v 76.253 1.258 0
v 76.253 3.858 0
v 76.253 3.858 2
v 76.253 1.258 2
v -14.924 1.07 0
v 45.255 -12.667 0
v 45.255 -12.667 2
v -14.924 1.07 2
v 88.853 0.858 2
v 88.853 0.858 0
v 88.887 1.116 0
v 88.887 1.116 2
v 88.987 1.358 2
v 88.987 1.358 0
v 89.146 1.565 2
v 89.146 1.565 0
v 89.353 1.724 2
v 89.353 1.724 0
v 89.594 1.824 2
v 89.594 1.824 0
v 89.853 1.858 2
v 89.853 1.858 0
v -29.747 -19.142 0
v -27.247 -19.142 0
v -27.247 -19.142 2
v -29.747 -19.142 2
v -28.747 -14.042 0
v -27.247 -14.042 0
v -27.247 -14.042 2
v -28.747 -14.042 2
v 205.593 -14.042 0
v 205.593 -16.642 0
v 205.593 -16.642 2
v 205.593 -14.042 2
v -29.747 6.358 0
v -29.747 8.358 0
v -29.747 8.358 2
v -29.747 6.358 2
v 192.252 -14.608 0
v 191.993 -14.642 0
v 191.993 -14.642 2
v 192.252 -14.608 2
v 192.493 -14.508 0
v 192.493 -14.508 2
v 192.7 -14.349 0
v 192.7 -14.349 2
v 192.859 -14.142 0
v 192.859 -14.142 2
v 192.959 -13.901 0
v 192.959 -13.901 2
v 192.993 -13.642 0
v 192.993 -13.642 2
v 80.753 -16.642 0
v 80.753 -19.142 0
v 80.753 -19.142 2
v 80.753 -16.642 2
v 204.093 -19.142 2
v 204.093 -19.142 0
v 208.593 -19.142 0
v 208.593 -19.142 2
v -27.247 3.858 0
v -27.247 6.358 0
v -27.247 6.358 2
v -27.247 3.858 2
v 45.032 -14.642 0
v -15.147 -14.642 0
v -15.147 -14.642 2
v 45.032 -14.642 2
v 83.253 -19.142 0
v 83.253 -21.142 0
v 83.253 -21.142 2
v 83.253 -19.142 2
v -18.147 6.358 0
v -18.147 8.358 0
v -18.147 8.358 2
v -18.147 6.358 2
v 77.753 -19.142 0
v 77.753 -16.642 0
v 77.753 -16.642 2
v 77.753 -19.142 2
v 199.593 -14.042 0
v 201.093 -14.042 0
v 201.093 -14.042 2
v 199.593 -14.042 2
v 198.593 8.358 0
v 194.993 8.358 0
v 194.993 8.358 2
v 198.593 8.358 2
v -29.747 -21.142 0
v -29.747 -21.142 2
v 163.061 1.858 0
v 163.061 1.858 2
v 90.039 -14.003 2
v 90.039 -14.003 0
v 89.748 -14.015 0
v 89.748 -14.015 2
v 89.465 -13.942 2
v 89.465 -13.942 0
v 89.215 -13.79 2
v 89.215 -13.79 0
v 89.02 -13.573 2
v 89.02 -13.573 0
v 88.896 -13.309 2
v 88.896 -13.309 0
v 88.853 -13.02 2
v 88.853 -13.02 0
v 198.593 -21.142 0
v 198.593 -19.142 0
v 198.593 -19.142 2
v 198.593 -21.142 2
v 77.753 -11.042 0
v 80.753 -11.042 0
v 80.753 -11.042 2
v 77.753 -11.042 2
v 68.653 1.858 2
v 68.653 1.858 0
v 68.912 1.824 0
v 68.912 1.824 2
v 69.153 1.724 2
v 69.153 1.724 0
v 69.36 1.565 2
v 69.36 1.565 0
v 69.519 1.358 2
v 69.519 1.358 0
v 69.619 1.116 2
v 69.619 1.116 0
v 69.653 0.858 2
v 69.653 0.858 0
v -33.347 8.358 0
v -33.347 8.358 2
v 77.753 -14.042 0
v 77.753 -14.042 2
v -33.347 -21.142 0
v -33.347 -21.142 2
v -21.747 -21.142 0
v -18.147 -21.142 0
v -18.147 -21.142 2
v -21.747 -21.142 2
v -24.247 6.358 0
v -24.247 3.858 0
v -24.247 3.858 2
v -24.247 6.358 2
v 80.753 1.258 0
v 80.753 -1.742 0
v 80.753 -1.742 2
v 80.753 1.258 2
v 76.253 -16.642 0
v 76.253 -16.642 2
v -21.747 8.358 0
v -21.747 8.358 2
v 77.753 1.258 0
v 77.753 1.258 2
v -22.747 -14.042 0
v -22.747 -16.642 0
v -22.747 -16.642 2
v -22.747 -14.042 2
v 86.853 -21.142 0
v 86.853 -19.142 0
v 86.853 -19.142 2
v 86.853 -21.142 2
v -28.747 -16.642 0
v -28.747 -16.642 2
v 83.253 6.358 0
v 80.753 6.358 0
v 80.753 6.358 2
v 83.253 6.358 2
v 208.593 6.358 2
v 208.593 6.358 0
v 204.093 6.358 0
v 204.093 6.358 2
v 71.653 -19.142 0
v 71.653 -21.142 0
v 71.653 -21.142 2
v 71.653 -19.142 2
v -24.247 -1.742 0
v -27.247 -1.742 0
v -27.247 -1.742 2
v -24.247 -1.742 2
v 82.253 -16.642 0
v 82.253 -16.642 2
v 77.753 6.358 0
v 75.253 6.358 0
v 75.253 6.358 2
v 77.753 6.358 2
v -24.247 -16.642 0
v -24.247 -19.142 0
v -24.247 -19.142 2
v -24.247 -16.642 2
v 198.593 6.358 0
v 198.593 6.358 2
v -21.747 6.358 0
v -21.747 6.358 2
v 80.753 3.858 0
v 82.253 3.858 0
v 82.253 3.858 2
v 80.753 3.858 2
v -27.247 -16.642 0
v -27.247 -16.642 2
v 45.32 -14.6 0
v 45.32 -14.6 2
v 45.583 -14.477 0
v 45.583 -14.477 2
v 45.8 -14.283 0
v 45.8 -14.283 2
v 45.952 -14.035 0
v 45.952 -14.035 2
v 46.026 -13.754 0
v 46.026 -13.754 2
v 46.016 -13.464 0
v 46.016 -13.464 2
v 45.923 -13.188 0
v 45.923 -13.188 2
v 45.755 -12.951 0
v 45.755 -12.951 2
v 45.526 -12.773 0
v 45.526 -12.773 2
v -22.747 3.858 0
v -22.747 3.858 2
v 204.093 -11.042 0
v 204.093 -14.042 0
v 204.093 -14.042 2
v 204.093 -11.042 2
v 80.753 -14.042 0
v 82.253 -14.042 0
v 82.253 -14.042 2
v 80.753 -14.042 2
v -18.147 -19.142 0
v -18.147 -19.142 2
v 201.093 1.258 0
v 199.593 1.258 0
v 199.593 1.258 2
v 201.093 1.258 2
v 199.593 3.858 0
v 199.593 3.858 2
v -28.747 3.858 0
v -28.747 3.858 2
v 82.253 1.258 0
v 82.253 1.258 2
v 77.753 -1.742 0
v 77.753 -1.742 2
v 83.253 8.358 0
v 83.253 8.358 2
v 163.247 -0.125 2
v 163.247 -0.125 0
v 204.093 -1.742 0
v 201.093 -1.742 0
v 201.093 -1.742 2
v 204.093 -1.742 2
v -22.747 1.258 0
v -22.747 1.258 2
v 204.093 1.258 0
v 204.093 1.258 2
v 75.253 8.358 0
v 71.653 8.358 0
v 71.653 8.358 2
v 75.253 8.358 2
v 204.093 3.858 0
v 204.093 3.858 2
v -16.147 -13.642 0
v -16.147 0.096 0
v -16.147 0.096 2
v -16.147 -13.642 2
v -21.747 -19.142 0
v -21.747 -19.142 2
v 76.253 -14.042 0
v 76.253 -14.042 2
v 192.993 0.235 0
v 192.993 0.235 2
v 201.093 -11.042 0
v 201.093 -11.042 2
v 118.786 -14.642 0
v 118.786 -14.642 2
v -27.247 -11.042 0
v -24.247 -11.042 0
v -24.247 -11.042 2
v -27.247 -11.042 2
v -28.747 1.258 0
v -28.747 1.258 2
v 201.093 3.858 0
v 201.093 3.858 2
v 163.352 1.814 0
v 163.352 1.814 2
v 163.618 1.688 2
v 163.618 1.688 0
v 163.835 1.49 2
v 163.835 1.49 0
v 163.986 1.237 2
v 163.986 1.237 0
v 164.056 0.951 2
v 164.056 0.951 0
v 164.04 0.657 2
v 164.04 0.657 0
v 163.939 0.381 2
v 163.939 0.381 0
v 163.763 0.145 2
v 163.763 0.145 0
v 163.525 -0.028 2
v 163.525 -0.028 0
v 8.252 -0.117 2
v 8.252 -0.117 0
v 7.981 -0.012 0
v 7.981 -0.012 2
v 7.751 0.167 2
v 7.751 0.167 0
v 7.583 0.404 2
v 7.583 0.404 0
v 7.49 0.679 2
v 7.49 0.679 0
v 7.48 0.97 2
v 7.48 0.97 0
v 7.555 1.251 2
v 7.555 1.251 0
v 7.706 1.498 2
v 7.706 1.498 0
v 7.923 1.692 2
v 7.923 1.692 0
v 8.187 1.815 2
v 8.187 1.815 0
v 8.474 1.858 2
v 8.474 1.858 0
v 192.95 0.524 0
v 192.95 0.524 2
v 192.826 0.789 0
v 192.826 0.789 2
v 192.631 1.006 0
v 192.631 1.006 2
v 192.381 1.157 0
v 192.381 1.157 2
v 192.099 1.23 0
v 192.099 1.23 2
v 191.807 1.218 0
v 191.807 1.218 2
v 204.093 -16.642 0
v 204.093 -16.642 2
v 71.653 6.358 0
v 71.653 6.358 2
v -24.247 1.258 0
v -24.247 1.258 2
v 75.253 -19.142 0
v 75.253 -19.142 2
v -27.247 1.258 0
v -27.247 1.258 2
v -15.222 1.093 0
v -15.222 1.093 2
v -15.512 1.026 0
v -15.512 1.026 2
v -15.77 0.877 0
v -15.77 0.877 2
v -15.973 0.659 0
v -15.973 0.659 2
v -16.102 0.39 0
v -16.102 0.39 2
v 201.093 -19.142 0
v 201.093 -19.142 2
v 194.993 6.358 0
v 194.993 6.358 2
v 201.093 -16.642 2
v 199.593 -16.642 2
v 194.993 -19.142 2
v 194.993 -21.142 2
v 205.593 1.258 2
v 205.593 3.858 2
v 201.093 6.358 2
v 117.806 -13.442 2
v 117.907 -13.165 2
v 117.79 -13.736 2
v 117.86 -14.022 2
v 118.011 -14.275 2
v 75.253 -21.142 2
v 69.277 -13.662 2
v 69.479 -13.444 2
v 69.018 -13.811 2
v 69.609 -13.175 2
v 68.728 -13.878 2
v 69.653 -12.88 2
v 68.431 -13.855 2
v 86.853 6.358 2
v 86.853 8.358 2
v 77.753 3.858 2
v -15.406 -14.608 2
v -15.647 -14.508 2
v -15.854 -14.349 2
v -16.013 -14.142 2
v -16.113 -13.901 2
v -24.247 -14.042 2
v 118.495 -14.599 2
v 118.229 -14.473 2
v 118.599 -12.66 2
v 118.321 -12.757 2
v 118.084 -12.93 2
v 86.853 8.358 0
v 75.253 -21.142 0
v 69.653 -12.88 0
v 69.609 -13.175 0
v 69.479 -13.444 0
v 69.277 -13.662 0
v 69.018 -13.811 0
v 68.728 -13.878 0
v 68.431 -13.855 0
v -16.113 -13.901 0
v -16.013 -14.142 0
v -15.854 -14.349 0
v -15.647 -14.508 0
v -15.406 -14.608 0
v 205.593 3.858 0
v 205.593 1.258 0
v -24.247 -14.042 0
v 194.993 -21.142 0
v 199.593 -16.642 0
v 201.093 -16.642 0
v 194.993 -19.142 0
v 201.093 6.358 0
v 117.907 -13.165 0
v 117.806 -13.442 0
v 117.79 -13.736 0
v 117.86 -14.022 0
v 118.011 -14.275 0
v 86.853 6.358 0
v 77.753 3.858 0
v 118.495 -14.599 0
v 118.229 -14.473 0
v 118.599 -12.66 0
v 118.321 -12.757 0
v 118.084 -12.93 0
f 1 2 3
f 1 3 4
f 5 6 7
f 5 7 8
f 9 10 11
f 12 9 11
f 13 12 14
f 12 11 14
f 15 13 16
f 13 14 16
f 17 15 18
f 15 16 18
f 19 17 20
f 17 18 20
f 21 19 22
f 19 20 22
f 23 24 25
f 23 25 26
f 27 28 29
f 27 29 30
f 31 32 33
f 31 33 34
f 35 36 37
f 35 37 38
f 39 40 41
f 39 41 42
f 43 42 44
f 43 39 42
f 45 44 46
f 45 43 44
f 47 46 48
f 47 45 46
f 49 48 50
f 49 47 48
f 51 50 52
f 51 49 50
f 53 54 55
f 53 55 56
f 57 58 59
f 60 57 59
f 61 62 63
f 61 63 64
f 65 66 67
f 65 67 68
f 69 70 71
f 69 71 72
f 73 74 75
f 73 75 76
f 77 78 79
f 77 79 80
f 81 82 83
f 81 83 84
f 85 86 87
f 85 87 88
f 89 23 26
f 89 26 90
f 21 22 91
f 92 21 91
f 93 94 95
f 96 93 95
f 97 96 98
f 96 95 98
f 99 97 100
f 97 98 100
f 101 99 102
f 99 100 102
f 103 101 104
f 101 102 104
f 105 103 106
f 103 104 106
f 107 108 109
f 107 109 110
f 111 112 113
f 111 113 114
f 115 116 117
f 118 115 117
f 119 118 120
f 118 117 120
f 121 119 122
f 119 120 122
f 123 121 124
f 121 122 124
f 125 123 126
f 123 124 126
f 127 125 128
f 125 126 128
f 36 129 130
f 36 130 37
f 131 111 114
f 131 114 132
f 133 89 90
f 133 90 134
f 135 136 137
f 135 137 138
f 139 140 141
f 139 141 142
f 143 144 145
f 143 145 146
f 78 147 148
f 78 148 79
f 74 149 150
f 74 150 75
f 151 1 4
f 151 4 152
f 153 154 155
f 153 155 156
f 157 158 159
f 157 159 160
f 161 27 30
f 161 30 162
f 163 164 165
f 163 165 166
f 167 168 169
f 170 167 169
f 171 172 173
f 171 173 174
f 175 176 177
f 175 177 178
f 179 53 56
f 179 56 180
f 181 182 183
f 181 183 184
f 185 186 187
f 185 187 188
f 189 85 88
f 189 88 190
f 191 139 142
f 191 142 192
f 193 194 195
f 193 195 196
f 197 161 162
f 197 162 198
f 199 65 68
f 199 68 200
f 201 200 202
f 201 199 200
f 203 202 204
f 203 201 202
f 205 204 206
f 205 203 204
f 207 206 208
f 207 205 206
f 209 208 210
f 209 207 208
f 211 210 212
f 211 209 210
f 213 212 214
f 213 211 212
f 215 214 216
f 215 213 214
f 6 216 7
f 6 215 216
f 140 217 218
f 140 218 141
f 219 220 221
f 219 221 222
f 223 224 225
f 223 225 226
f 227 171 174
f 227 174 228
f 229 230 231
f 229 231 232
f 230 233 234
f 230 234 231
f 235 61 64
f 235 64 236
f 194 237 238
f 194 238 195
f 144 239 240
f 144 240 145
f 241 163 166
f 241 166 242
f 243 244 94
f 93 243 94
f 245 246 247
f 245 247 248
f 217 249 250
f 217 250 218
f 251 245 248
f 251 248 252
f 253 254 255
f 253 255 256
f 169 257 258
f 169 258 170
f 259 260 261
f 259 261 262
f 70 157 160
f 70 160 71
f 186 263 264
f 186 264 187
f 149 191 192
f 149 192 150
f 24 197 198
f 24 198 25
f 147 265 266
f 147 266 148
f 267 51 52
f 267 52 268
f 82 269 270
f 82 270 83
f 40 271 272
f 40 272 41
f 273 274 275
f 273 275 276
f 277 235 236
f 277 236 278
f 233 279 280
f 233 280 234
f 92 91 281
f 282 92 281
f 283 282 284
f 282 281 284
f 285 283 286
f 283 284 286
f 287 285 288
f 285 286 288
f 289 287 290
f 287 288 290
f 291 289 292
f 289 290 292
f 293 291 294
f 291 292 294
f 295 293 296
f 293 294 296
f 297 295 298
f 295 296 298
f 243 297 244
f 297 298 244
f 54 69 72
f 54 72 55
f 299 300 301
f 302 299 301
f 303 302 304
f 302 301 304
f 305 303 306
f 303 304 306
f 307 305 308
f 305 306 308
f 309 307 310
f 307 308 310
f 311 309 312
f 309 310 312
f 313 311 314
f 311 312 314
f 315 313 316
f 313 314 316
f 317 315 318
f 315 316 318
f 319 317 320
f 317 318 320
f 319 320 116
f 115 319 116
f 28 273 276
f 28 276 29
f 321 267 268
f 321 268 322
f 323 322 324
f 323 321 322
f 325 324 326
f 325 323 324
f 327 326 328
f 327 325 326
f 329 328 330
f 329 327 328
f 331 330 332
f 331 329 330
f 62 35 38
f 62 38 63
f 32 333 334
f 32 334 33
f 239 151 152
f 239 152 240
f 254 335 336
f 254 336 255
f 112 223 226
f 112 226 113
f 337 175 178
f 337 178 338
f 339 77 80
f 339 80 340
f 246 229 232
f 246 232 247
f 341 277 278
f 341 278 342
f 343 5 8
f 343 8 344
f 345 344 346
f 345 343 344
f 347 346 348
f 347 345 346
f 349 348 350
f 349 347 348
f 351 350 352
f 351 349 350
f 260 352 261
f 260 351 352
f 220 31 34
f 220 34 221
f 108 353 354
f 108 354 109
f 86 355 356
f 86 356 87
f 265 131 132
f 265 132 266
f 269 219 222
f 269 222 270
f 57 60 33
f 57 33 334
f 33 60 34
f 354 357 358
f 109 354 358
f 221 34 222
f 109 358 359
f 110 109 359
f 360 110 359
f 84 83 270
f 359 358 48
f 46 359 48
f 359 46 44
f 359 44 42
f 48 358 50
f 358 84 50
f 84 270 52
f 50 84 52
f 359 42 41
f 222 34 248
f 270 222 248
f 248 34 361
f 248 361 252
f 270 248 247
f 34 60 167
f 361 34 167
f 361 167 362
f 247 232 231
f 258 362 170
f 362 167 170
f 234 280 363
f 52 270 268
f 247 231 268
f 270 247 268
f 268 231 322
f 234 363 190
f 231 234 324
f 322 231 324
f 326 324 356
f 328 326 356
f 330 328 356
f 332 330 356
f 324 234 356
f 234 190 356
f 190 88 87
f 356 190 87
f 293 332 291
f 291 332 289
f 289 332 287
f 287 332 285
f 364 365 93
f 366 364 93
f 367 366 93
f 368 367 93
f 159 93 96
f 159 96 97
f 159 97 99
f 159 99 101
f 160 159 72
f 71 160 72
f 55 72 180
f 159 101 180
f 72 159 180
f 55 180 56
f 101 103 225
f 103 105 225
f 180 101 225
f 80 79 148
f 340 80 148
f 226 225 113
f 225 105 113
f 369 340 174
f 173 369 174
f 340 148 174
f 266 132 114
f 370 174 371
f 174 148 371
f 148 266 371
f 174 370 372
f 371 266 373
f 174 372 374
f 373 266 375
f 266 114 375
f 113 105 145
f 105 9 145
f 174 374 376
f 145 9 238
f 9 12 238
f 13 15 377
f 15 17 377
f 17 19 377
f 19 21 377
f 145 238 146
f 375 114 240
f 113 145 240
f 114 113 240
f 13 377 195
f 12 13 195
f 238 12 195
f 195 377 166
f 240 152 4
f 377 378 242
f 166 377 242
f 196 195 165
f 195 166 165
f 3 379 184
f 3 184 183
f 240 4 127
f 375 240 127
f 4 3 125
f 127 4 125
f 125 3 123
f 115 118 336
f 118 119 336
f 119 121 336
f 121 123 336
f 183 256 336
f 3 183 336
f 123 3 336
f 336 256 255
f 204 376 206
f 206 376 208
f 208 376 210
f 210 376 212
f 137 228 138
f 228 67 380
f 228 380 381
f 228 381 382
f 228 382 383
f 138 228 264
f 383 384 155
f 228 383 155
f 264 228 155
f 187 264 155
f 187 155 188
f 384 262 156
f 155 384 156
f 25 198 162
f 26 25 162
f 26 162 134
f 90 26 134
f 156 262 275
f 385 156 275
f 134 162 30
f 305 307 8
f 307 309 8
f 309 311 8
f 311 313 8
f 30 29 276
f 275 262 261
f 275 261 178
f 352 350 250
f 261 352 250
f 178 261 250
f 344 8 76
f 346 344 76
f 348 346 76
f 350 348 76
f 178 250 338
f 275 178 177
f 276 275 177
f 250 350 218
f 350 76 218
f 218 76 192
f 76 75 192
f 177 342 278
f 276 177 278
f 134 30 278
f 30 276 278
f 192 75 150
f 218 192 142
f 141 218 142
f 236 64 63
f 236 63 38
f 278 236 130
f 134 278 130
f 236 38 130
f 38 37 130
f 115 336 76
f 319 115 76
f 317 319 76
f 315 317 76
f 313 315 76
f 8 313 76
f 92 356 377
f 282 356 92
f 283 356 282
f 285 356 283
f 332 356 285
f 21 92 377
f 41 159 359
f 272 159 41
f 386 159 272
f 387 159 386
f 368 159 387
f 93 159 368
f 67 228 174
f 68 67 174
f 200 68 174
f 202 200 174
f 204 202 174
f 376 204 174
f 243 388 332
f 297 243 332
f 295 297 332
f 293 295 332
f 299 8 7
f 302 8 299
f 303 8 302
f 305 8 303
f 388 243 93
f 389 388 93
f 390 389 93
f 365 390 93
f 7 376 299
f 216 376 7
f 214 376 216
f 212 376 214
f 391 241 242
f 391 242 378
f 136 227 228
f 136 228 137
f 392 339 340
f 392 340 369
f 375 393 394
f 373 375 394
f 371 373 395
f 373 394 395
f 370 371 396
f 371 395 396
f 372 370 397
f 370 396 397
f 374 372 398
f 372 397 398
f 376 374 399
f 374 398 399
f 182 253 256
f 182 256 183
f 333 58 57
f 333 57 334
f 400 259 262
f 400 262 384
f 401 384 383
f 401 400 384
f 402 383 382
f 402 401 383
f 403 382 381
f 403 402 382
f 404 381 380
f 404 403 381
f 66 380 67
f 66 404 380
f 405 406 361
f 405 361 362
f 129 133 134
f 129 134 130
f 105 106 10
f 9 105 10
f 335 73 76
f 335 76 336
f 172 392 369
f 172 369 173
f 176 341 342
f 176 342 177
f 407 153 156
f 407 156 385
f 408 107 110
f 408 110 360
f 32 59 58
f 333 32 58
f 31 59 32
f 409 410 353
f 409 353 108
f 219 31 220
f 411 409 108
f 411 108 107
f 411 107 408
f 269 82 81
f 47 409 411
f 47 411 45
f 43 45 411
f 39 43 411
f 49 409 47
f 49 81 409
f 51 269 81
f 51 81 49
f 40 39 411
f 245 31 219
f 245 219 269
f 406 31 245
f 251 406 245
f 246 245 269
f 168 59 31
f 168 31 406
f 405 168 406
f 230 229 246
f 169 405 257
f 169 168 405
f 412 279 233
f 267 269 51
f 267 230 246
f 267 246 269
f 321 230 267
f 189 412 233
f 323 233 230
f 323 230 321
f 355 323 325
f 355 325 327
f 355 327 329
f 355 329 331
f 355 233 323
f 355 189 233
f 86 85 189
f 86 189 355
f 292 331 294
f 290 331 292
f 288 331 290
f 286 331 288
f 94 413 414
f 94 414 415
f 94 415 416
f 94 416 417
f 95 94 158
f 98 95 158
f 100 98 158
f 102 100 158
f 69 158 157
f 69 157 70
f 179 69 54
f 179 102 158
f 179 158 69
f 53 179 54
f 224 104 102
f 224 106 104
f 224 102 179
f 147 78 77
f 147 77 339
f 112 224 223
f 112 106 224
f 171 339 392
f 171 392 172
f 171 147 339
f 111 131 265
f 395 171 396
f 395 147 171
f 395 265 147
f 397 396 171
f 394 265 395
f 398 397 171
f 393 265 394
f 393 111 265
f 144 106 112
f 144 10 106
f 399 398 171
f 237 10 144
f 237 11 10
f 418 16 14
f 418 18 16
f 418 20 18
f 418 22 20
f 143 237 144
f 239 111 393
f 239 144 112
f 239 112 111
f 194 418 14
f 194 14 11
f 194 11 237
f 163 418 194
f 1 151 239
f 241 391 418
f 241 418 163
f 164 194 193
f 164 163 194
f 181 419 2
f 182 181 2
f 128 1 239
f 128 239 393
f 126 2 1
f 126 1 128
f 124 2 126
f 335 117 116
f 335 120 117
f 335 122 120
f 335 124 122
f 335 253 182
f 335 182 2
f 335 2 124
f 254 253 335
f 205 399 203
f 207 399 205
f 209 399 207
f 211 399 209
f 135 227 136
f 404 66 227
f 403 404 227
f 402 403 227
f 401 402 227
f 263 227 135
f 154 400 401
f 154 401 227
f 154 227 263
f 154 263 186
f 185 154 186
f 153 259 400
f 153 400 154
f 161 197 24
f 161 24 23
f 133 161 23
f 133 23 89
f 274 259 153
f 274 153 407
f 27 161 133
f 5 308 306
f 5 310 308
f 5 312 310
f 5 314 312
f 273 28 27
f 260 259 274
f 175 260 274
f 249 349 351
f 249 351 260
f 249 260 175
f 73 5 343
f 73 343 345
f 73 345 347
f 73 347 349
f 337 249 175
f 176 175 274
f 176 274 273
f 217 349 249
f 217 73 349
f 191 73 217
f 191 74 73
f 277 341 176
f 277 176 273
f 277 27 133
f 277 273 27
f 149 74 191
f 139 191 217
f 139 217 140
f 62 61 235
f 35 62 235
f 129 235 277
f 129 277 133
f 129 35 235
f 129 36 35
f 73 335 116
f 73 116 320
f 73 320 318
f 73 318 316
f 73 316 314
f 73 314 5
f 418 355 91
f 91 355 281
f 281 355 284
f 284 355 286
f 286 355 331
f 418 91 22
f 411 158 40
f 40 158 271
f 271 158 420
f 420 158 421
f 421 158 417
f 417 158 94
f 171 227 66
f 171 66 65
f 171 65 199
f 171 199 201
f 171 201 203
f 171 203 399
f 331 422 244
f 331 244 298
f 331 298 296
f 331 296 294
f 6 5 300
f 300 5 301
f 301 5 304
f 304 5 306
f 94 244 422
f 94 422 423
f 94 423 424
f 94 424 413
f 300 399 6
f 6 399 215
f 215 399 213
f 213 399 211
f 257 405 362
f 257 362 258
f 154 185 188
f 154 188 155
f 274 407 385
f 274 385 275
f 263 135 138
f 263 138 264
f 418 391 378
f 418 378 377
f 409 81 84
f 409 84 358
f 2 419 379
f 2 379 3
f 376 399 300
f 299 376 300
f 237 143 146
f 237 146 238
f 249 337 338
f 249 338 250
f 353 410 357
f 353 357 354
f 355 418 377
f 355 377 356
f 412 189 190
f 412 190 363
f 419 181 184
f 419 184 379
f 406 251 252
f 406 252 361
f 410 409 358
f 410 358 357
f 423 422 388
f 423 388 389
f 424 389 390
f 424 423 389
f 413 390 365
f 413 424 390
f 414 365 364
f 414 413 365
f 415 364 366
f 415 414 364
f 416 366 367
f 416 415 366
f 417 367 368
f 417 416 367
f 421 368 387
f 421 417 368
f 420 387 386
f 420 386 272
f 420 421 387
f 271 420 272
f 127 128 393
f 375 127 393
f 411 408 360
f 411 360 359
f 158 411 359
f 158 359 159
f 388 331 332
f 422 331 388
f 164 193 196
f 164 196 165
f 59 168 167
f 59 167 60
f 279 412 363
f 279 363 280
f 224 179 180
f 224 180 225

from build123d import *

# Parameters (mm, degrees)
EXTRUDE_1_DEPTH = 2


with BuildPart() as part:
    # 草图2 → 凸台-拉伸1 (new body)
    with BuildSketch(Plane.XY):
        Polygon((-24.246895077, 6.357612039), (-21.746895077, 6.357612039), (-21.746895077, 8.357612039), (-18.146895077, 8.357612039), (-18.146895077, 6.357612039), (71.653104923, 6.357612039), (71.653104923, 8.357612039), (75.253104923, 8.357612039), (75.253104923, 6.357612039), (77.753104923, 6.357612039), (77.753104923, 3.857612039), (76.253104923, 3.857612039), (76.253104923, 1.257612039), (77.753104923, 1.257612039), (77.753104923, -1.742387961), (80.753104923, -1.742387961), (80.753104923, 1.257612039), (82.253104923, 1.257612039), (82.253104923, 3.857612039), (80.753104923, 3.857612039), (80.753104923, 6.357612039), (83.253104923, 6.357612039), (83.253104923, 8.357612039), (86.853104923, 8.357612039), (86.853104923, 6.357612039), (194.993104923, 6.357612039), (194.993104923, 8.357612039), (198.593104923, 8.357612039), (198.593104923, 6.357612039), (201.093104923, 6.357612039), (201.093104923, 3.857612039), (199.593104923, 3.857612039), (199.593104923, 1.257612039), (201.093104923, 1.257612039), (201.093104923, -1.742387961), (204.093104923, -1.742387961), (204.093104923, 1.257612039), (205.593104923, 1.257612039), (205.593104923, 3.857612039), (204.093104923, 3.857612039), (204.093104923, 6.357612039), (206.593104923, 6.357612039), (208.593104923, 6.357612039), (208.593104923, -19.142387961), (206.593104923, -19.142387961), (204.093104923, -19.142387961), (204.093104923, -16.642387961), (205.593104923, -16.642387961), (205.593104923, -14.042387961), (204.093104923, -14.042387961), (204.093104923, -11.042387961), (201.093104923, -11.042387961), (201.093104923, -14.042387961), (199.593104923, -14.042387961), (199.593104923, -16.642387961), (201.093104923, -16.642387961), (201.093104923, -19.142387961), (198.593104923, -19.142387961), (198.593104923, -21.142387961), (194.993104923, -21.142387961), (194.993104923, -19.142387961), (86.853104923, -19.142387961), (86.853104923, -21.142387961), (83.253104923, -21.142387961), (83.253104923, -19.142387961), (80.753104923, -19.142387961), (80.753104923, -16.642387961), (82.253104923, -16.642387961), (82.253104923, -14.042387961), (80.753104923, -14.042387961), (80.753104923, -11.042387961), (77.753104923, -11.042387961), (77.753104923, -14.042387961), (76.253104923, -14.042387961), (76.253104923, -16.642387961), (77.753104923, -16.642387961), (77.753104923, -19.142387961), (75.253104923, -19.142387961), (75.253104923, -21.142387961), (71.653104923, -21.142387961), (71.653104923, -19.142387961), (-18.146895077, -19.142387961), (-18.146895077, -21.142387961), (-21.746895077, -21.142387961), (-21.746895077, -19.142387961), (-24.246895077, -19.142387961), (-24.246895077, -16.642387961), (-22.746895077, -16.642387961), (-22.746895077, -14.042387961), (-24.246895077, -14.042387961), (-24.246895077, -11.042387961), (-27.246895077, -11.042387961), (-27.246895077, -14.042387961), (-28.746895077, -14.042387961), (-28.746895077, -16.642387961), (-27.246895077, -16.642387961), (-27.246895077, -19.142387961), (-29.746895077, -19.142387961), (-29.746895077, -21.142387961), (-33.346895077, -21.142387961), (-33.346895077, 8.357612039), (-29.746895077, 8.357612039), (-29.746895077, 6.357612039), (-27.246895077, 6.357612039), (-27.246895077, 3.857612039), (-28.746895077, 3.857612039), (-28.746895077, 1.257612039), (-27.246895077, 1.257612039), (-27.246895077, -1.742387961), (-24.246895077, -1.742387961), (-24.246895077, 1.257612039), (-22.746895077, 1.257612039), (-22.746895077, 3.857612039), (-24.246895077, 3.857612039), align=None)
        with BuildLine():
            Line((8.47411064, 1.857612039), (68.653104923, 1.857612039))
            ThreePointArc((68.653104923, 1.857612039), (69.360211704, 1.56471882), (69.653104923, 0.857612039))
            Line((69.653104923, 0.857612039), (69.653104923, -12.880354362))
            ThreePointArc((69.653104923, -12.880354362), (69.276579267, -13.662198172), (68.430545438, -13.855273474))
            Line((68.430545438, -13.855273474), (8.251551154, -0.117307073))
            ThreePointArc((8.251551154, -0.117307073), (7.480400644, 0.969596162), (8.47411064, 1.857612039))
        make_face(mode=Mode.SUBTRACT)
        with BuildLine():
            Line((89.853104923, 1.857612039), (163.060529367, 1.857612039))
            ThreePointArc((163.060529367, 1.857612039), (164.056145258, 0.95114811), (163.246781366, -0.124889968))
            Line((163.246781366, -0.124889968), (90.039356922, -14.002753858))
            ThreePointArc((90.039356922, -14.002753858), (89.215238165, -13.79039859), (88.853104923, -13.020251852))
            Line((88.853104923, -13.020251852), (88.853104923, 0.857612039))
            ThreePointArc((88.853104923, 0.857612039), (89.145998142, 1.56471882), (89.853104923, 1.857612039))
        make_face(mode=Mode.SUBTRACT)
        with BuildLine():
            Line((118.785680479, -14.642387961), (191.993104923, -14.642387961))
            ThreePointArc((191.993104923, -14.642387961), (192.700211704, -14.349494742), (192.993104923, -13.642387961))
            Line((192.993104923, -13.642387961), (192.993104923, 0.235475929))
            ThreePointArc((192.993104923, 0.235475929), (192.630971681, 1.005622668), (191.806852924, 1.217977936))
            Line((191.806852924, 1.217977936), (118.599428481, -12.659885955))
            ThreePointArc((118.599428481, -12.659885955), (117.790064588, -13.735924033), (118.785680479, -14.642387961))
        make_face(mode=Mode.SUBTRACT)
        with BuildLine():
            Line((-16.146895077, 0.09557844), (-16.146895077, -13.642387961))
            ThreePointArc((-16.146895077, -13.642387961), (-15.854001858, -14.349494742), (-15.146895077, -14.642387961))
            Line((-15.146895077, -14.642387961), (45.032099206, -14.642387961))
            ThreePointArc((45.032099206, -14.642387961), (46.025809202, -13.754372085), (45.254658692, -12.667468849))
            Line((45.254658692, -12.667468849), (-14.924335591, 1.070497552))
            ThreePointArc((-14.924335591, 1.070497552), (-15.770369421, 0.877422249), (-16.146895077, 0.09557844))
        make_face(mode=Mode.SUBTRACT)
    extrude(amount=EXTRUDE_1_DEPTH)


solid = part.part
